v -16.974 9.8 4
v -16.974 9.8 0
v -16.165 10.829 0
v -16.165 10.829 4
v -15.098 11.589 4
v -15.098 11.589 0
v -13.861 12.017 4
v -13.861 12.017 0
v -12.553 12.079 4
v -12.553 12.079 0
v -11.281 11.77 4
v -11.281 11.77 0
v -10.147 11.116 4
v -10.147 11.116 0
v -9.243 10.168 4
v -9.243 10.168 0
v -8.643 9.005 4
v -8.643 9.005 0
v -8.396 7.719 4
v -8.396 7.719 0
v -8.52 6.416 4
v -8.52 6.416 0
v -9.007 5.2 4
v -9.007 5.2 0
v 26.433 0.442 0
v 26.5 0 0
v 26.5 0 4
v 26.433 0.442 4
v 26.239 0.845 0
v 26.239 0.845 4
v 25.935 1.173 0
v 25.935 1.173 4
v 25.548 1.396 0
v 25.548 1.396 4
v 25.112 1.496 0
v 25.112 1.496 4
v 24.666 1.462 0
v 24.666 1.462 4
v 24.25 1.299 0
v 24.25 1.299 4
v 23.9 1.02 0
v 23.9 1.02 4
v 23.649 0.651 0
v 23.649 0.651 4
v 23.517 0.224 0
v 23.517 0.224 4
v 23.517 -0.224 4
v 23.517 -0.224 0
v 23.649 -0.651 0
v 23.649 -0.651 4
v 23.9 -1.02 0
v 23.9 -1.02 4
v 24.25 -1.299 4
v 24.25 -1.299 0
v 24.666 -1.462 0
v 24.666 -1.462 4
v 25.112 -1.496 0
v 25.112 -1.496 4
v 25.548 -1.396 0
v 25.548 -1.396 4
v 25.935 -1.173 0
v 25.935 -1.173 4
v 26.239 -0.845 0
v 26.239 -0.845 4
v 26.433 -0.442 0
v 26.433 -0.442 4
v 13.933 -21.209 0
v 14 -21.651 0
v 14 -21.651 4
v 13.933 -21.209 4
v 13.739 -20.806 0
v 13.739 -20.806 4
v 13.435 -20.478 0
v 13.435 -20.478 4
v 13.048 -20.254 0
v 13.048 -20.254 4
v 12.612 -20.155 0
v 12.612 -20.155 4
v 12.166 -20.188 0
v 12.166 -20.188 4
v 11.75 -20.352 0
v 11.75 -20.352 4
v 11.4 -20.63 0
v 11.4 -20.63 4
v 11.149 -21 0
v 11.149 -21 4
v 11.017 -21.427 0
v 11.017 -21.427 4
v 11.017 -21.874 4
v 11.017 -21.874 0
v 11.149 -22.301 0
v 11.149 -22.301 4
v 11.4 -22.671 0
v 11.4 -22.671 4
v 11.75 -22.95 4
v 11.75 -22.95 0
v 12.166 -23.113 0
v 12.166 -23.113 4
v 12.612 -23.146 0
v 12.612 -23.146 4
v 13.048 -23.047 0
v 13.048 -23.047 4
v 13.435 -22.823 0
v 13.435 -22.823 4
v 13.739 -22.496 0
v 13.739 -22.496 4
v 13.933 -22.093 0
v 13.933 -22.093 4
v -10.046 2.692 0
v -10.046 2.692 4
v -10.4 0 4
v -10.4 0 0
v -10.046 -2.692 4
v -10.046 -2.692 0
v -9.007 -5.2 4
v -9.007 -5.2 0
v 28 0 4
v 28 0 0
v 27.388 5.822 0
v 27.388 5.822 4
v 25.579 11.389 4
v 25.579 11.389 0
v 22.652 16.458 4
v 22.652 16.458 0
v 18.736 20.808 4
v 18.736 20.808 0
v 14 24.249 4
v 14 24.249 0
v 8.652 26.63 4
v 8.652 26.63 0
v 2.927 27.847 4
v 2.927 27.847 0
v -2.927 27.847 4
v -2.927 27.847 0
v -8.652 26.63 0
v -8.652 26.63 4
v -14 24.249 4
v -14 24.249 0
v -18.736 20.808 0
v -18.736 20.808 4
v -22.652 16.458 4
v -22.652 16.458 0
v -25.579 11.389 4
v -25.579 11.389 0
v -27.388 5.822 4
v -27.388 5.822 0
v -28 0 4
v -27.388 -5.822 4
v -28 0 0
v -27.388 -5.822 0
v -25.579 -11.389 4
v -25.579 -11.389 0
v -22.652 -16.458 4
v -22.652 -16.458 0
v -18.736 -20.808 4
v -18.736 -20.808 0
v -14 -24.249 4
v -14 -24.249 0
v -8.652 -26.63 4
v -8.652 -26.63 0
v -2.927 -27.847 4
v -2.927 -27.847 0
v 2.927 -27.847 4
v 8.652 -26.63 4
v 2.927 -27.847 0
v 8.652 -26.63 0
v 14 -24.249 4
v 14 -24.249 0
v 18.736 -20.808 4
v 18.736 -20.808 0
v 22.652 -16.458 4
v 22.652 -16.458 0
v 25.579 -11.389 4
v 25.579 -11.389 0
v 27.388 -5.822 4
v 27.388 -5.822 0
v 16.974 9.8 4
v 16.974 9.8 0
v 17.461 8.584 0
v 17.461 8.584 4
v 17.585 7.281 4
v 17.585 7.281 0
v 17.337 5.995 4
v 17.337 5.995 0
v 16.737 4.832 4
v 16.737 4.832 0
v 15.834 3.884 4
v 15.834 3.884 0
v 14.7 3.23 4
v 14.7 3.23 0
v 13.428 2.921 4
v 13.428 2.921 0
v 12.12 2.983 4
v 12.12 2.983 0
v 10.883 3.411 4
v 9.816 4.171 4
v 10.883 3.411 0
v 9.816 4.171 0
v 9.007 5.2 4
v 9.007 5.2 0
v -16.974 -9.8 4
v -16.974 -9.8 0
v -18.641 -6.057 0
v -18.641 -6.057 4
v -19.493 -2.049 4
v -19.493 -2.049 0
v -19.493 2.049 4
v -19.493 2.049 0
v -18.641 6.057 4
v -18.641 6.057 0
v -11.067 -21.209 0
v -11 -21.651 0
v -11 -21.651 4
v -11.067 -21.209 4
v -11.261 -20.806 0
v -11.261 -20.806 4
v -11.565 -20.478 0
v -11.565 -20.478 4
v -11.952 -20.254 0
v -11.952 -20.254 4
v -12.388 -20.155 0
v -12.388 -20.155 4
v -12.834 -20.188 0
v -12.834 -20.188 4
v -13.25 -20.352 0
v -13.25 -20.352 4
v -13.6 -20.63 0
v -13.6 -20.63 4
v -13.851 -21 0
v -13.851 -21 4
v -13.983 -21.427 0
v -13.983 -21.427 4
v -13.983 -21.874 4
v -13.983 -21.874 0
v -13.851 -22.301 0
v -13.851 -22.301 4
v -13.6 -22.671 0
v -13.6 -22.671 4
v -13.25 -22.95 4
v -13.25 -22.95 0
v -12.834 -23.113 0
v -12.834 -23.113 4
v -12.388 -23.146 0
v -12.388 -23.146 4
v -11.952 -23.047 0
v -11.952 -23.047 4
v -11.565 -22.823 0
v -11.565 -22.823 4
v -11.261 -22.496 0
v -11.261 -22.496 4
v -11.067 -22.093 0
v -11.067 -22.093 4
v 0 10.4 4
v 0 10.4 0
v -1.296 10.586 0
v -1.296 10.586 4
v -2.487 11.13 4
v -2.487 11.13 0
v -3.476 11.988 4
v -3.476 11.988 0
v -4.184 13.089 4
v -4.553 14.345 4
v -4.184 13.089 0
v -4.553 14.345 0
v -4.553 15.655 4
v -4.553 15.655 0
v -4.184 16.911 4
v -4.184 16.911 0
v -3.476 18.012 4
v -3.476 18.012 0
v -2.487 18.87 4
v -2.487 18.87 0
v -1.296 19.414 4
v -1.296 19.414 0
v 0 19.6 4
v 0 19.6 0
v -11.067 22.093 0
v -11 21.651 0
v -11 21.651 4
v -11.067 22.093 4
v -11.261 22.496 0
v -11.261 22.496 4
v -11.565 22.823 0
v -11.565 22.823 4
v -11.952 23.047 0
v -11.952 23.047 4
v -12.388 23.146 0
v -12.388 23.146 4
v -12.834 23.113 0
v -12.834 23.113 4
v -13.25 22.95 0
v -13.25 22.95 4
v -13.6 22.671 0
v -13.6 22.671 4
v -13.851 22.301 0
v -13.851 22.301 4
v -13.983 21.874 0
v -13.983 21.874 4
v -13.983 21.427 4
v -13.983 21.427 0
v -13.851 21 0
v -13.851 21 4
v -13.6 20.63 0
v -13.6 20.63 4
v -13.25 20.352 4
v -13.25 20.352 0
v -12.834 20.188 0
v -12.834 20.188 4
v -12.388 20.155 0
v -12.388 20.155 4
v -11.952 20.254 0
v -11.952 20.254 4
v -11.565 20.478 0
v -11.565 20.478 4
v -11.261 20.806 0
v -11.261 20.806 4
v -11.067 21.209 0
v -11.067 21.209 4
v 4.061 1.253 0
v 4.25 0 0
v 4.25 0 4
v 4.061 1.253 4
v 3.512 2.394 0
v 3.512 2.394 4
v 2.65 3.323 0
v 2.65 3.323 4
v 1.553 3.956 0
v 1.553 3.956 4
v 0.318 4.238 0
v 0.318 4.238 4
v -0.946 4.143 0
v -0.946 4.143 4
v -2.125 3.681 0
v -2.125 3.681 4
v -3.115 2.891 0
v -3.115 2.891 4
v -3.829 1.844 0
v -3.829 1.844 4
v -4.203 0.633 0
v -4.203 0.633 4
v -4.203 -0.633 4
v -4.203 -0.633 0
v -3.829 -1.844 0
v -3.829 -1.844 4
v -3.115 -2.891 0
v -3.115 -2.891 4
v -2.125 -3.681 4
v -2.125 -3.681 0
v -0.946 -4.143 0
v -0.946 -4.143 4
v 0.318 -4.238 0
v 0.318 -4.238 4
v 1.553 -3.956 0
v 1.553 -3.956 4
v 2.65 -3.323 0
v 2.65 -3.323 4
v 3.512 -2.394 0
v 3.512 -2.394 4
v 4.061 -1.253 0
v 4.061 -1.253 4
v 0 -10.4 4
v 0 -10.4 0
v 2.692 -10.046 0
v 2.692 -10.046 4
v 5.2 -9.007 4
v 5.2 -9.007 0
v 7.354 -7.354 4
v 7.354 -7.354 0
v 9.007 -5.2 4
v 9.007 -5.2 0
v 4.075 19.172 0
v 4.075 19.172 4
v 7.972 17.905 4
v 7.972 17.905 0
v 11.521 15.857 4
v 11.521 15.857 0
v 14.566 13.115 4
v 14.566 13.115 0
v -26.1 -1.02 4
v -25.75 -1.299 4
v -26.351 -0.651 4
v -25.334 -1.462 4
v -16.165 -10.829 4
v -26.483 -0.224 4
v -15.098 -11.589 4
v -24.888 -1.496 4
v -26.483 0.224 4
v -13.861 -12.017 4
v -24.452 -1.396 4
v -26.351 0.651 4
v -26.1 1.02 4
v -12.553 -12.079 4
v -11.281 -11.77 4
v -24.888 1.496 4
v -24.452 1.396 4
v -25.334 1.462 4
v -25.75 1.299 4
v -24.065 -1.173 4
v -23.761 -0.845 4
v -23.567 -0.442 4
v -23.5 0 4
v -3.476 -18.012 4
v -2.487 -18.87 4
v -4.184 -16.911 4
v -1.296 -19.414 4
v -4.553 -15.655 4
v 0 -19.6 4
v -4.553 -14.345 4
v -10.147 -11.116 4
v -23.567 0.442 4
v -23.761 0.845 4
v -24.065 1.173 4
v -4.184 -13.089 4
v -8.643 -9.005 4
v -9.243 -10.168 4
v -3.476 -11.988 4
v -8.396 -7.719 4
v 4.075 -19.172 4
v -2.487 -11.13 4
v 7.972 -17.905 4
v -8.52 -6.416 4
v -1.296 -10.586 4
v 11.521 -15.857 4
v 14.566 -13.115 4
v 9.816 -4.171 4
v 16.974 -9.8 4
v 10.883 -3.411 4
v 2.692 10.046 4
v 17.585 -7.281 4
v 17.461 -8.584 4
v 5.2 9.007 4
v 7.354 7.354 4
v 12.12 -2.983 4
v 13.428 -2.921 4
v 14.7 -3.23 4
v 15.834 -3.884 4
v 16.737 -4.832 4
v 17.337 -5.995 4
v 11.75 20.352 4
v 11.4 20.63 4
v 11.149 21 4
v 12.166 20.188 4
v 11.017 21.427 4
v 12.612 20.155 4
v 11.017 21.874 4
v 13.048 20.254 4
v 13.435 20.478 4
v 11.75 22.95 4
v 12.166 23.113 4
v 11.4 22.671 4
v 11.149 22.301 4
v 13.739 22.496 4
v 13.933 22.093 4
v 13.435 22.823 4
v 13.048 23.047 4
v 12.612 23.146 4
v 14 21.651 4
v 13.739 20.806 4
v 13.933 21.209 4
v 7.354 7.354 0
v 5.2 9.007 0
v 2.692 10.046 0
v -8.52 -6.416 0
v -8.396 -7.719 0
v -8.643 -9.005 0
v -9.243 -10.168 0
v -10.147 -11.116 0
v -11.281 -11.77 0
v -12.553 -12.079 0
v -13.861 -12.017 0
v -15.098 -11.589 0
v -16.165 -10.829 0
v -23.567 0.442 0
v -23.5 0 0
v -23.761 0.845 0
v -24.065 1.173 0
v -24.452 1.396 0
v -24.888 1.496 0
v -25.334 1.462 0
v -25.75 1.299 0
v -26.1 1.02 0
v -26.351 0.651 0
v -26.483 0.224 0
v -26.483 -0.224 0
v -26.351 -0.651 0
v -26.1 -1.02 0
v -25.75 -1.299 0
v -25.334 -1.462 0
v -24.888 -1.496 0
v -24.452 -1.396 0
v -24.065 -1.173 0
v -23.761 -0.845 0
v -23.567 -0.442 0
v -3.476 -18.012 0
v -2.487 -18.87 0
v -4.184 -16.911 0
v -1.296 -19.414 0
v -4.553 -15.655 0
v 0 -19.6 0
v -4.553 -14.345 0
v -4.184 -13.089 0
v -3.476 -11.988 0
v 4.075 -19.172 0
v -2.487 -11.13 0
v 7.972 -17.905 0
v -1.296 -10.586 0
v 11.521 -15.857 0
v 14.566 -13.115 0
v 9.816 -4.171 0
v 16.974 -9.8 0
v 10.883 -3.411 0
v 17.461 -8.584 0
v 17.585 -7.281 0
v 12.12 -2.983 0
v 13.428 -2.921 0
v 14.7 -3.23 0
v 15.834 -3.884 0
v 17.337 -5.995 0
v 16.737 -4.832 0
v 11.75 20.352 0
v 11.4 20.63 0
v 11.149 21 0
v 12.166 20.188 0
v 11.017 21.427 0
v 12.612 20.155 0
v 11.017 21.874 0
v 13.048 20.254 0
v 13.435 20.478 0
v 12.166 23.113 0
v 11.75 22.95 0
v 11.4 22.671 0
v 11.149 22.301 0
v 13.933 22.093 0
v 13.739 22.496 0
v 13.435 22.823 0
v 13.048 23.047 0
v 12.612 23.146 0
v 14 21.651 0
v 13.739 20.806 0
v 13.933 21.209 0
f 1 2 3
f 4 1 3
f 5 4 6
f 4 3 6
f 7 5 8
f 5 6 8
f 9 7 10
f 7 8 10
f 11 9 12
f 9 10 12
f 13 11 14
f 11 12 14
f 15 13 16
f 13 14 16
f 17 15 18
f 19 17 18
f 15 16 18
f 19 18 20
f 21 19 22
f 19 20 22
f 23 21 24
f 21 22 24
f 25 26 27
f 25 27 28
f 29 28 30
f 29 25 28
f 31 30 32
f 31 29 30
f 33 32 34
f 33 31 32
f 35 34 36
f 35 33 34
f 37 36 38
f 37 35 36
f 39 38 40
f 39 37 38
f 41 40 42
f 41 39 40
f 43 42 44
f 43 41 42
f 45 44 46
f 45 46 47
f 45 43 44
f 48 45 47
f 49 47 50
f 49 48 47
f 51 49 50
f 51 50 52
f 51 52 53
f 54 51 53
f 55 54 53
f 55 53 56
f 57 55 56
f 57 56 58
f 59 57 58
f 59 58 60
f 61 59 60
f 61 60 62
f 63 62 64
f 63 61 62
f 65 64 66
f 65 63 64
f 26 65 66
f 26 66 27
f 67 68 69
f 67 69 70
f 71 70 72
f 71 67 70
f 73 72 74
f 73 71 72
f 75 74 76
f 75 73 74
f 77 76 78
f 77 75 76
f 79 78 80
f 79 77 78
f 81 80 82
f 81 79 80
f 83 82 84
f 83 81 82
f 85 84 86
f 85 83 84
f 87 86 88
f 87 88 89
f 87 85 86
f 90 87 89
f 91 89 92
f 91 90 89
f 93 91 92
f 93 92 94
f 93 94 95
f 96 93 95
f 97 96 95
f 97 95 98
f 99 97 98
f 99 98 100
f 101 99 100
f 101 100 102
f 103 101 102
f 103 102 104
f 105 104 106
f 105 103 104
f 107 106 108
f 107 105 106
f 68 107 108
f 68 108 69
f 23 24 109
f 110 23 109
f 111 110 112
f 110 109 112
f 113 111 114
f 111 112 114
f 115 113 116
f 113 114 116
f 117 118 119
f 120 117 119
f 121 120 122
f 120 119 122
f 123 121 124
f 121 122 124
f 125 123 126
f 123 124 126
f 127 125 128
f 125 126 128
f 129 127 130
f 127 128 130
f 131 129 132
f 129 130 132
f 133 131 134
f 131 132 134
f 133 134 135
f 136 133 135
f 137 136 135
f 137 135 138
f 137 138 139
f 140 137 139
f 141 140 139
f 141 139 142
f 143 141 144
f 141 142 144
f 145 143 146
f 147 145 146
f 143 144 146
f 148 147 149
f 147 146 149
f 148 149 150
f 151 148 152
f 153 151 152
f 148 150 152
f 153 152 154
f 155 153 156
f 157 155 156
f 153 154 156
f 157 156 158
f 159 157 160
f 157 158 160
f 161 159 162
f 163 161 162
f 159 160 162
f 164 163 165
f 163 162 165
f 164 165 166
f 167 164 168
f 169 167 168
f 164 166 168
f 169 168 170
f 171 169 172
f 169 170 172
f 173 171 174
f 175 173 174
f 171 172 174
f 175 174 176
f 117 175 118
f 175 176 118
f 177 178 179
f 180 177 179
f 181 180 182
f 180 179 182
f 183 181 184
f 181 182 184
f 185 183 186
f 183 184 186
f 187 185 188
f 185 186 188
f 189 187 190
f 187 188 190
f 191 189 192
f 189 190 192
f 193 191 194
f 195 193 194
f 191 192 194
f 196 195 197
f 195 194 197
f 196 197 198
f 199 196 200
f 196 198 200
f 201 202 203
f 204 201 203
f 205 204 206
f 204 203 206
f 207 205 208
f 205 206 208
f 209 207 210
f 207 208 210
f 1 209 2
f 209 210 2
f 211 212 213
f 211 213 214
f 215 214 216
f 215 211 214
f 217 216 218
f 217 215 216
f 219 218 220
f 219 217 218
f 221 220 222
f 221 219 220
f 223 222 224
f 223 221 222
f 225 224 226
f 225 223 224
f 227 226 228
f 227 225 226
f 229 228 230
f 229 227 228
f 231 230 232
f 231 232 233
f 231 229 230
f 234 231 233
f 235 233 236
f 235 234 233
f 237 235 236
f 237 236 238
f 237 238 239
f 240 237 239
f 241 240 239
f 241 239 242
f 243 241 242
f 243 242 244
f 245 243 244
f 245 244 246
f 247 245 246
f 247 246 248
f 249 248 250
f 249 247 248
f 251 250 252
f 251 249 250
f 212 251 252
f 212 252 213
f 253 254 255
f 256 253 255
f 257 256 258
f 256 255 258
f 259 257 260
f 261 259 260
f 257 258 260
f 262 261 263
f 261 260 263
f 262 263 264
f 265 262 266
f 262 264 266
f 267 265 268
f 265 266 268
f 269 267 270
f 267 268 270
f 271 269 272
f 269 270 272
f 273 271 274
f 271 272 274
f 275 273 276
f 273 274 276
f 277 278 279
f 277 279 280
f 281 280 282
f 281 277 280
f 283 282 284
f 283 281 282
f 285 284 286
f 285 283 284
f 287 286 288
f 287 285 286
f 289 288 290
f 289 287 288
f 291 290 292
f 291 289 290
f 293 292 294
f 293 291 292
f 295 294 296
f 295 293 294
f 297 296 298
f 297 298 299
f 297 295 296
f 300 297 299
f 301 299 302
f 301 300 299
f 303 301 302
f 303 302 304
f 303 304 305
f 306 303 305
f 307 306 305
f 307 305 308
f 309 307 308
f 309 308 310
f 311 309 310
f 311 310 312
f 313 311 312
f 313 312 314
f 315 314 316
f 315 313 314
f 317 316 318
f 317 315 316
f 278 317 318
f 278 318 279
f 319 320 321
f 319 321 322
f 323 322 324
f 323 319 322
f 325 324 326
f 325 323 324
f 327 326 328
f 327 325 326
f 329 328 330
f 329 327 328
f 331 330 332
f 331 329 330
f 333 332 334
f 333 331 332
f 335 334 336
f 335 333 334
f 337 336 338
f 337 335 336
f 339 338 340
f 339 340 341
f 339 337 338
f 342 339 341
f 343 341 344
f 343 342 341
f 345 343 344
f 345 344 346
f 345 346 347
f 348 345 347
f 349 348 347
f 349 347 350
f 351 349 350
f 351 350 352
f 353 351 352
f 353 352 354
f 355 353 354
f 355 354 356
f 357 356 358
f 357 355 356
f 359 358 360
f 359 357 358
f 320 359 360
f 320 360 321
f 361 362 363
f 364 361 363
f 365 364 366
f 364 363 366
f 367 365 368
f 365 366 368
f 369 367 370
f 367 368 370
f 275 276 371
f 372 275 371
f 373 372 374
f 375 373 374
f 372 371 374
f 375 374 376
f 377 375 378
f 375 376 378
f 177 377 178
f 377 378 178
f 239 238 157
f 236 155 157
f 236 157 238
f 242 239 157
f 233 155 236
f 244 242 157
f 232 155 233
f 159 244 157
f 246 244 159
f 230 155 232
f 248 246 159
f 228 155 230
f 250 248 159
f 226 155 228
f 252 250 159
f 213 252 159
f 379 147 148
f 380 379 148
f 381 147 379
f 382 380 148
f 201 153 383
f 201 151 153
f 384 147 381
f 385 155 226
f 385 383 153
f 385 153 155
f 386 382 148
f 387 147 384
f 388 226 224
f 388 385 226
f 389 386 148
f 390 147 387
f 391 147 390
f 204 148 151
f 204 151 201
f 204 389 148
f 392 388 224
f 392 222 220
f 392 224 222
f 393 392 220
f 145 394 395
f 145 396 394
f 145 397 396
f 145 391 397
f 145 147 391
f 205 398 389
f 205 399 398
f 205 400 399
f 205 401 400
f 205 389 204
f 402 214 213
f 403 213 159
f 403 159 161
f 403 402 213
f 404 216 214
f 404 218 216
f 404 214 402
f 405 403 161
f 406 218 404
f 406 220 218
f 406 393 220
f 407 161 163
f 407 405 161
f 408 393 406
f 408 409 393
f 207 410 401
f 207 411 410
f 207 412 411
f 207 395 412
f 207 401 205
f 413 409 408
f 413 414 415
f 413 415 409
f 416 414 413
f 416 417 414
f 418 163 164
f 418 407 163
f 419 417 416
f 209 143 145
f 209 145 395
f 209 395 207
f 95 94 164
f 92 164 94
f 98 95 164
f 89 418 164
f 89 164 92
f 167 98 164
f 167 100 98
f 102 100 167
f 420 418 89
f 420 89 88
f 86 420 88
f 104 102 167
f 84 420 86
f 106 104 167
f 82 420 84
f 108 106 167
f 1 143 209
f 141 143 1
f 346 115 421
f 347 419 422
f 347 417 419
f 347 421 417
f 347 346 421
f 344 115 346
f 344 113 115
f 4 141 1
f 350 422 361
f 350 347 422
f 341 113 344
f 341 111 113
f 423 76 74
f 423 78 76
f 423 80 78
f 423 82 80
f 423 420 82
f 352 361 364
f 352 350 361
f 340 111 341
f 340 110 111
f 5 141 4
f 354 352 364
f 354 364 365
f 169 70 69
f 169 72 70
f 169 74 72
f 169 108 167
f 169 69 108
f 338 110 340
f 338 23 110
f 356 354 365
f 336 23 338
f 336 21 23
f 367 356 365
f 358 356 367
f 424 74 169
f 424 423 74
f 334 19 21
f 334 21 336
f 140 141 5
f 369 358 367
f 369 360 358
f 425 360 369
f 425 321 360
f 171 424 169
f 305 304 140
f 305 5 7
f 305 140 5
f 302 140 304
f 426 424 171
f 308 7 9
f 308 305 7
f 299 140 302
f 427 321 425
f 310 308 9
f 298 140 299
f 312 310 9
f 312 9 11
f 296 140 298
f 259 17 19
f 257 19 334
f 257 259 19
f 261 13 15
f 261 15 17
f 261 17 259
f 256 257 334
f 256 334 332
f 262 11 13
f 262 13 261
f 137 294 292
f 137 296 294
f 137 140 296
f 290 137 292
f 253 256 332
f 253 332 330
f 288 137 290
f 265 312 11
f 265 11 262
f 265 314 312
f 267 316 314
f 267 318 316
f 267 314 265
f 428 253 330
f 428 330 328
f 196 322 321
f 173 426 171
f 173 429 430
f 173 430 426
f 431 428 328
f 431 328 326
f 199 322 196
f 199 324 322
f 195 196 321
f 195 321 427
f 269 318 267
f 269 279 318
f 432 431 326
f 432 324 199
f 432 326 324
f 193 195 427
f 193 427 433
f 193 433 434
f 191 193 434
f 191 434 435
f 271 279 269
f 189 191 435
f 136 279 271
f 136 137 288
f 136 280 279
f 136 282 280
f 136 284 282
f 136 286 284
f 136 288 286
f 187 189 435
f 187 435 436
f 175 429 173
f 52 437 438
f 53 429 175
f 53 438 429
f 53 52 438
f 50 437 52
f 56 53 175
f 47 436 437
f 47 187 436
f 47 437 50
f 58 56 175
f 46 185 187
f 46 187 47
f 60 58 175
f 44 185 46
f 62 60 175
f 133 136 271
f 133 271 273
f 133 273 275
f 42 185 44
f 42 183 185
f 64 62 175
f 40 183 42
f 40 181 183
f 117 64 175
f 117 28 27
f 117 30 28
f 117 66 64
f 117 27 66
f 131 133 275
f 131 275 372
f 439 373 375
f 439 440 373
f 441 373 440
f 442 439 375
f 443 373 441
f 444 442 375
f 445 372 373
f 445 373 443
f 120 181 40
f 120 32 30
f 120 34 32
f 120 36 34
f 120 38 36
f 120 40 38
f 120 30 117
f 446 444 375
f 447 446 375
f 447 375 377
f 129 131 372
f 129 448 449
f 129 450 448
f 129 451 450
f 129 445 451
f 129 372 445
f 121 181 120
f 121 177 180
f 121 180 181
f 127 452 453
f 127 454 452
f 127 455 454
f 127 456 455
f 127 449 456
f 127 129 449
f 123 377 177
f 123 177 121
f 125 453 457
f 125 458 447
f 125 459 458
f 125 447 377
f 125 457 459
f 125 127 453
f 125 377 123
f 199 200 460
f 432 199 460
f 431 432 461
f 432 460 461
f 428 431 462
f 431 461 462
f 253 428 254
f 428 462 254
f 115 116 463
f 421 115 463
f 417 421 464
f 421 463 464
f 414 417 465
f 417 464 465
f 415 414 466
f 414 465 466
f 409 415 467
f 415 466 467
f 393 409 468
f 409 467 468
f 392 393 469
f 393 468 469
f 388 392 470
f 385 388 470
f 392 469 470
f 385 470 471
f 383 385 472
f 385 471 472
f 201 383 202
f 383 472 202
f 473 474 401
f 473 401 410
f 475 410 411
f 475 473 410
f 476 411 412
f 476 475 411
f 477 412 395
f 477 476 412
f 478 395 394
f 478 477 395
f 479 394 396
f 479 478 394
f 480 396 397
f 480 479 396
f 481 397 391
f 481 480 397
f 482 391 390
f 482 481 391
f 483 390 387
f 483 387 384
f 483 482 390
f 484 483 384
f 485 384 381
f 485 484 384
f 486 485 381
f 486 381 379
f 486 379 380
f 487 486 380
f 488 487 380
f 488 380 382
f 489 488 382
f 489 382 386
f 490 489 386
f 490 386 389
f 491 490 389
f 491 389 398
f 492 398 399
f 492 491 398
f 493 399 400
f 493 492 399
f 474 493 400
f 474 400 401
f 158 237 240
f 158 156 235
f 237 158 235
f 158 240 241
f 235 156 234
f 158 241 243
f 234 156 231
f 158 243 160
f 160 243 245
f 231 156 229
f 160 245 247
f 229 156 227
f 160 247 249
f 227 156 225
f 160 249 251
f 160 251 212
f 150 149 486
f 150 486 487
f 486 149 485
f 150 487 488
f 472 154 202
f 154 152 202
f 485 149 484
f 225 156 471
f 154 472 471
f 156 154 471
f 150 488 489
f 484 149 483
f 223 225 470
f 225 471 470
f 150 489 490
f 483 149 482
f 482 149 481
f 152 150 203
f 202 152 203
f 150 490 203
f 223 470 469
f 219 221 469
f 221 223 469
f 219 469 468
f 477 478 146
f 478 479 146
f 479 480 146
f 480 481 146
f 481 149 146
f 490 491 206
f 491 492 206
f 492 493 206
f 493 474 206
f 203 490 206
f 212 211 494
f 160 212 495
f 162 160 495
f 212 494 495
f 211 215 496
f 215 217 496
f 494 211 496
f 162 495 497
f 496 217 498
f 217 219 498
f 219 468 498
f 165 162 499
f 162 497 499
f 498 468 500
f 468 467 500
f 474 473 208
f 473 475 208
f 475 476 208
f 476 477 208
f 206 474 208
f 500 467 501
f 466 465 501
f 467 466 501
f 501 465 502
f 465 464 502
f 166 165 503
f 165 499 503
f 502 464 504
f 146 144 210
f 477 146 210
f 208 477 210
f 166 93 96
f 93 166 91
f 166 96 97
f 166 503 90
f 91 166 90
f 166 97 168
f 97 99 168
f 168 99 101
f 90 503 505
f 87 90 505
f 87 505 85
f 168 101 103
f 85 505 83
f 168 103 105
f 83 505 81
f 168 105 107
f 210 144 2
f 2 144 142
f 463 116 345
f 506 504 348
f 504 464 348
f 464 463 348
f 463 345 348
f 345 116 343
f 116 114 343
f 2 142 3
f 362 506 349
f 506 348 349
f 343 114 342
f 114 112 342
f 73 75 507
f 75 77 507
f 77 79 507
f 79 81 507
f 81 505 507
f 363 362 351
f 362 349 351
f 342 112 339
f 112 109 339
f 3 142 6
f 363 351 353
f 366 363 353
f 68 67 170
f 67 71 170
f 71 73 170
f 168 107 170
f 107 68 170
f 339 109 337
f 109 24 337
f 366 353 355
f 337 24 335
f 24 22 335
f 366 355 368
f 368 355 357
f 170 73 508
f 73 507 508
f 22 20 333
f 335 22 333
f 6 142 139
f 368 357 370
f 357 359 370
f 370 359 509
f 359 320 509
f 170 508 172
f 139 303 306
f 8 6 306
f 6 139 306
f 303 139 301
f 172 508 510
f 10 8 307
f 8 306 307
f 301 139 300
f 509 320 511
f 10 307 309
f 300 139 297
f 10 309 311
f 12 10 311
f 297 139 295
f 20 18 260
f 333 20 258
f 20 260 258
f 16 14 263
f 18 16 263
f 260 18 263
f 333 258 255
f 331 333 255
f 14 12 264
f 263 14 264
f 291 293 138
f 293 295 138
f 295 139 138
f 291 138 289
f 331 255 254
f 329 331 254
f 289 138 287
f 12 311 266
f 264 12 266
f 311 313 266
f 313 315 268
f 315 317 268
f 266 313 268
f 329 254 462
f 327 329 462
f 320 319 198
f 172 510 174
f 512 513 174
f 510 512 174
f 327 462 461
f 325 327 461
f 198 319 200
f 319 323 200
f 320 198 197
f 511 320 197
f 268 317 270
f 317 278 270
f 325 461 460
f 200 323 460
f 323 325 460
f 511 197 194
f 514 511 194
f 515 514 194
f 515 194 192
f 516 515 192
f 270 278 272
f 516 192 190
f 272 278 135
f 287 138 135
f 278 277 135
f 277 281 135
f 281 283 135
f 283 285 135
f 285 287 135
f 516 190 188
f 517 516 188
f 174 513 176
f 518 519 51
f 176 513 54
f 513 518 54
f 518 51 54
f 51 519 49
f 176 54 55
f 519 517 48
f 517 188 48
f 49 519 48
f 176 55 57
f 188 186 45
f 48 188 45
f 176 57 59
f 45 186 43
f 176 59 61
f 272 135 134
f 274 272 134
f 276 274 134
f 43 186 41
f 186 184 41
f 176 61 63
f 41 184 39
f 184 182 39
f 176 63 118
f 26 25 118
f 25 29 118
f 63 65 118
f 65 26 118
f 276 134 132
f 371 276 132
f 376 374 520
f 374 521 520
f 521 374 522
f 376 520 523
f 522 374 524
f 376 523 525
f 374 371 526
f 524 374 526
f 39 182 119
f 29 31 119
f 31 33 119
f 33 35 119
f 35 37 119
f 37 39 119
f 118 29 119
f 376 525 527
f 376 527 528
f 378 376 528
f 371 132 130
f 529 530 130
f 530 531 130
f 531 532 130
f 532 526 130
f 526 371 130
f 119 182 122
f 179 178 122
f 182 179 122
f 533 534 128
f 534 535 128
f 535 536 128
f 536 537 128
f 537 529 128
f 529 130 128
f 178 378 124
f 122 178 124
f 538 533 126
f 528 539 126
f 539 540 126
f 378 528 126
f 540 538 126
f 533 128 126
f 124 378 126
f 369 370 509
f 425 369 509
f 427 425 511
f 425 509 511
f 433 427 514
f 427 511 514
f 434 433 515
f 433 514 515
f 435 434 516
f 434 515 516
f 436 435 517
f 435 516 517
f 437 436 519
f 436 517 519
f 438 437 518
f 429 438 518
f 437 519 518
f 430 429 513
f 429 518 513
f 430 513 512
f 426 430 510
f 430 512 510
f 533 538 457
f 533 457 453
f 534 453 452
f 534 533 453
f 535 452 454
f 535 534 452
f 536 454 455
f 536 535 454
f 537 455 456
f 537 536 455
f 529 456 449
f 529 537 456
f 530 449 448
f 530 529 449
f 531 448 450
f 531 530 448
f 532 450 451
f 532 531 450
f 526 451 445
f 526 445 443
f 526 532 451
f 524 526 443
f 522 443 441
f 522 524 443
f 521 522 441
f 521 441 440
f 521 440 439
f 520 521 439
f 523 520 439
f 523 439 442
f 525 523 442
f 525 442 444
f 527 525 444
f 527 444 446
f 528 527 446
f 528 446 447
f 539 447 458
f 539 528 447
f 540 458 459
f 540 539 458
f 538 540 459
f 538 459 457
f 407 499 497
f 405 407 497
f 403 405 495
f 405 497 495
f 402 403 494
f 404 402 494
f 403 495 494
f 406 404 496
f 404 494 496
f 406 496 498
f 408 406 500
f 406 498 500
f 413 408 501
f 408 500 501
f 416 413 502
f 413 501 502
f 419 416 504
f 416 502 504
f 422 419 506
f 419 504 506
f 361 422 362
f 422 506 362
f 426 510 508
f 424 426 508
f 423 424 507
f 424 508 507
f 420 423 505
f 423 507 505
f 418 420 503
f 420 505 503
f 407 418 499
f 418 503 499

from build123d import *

# Parameters (mm, degrees)
SKETCH_1_R      = 28
SKETCH_1_R_2    = 4.25
SKETCH_1_R_3    = 1.5
EXTRUDE_1_DEPTH = 4


with BuildPart() as part:
    # 草图1 → 凸台-拉伸1 (new body)
    with BuildSketch(Plane.XY):
        Circle(SKETCH_1_R)
        Circle(SKETCH_1_R_2, mode=Mode.SUBTRACT)
        with Locations((12.5, 21.650635095)):
            Circle(SKETCH_1_R_3, mode=Mode.SUBTRACT)
        with Locations((25, 0)):
            Circle(SKETCH_1_R_3, mode=Mode.SUBTRACT)
        with Locations((12.5, -21.650635095)):
            Circle(SKETCH_1_R_3, mode=Mode.SUBTRACT)
        with Locations((-12.5, -21.650635095)):
            Circle(SKETCH_1_R_3, mode=Mode.SUBTRACT)
        with Locations((-25, 0)):
            Circle(SKETCH_1_R_3, mode=Mode.SUBTRACT)
        with Locations((-12.5, 21.650635095)):
            Circle(SKETCH_1_R_3, mode=Mode.SUBTRACT)
        with BuildLine():
            ThreePointArc((9.006664199, -5.2), (15.290381057, -3.516283143), (16.974097914, -9.8))
            ThreePointArc((16.974097914, -9.8), (9.8, -16.974097914), (0, -19.6))
            ThreePointArc((0, -19.6), (-4.6, -15), (0, -10.4))
            ThreePointArc((0, -10.4), (5.2, -9.006664199), (9.006664199, -5.2))
        make_face(mode=Mode.SUBTRACT)
        with BuildLine():
            ThreePointArc((-9.006664199, 5.2), (-10.4, 0), (-9.006664199, -5.2))
            ThreePointArc((-9.006664199, -5.2), (-10.690381057, -11.483716857), (-16.974097914, -9.8))
            ThreePointArc((-16.974097914, -9.8), (-19.6, 0), (-16.974097914, 9.8))
            ThreePointArc((-16.974097914, 9.8), (-10.690381057, 11.483716857), (-9.006664199, 5.2))
        make_face(mode=Mode.SUBTRACT)
        with BuildLine():
            ThreePointArc((9.006664199, 5.2), (5.2, 9.006664199), (0, 10.4))
            ThreePointArc((0, 10.4), (-4.6, 15), (0, 19.6))
            ThreePointArc((0, 19.6), (9.8, 16.974097914), (16.974097914, 9.8))
            ThreePointArc((16.974097914, 9.8), (15.290381057, 3.516283143), (9.006664199, 5.2))
        make_face(mode=Mode.SUBTRACT)
    extrude(amount=EXTRUDE_1_DEPTH)


solid = part.part
